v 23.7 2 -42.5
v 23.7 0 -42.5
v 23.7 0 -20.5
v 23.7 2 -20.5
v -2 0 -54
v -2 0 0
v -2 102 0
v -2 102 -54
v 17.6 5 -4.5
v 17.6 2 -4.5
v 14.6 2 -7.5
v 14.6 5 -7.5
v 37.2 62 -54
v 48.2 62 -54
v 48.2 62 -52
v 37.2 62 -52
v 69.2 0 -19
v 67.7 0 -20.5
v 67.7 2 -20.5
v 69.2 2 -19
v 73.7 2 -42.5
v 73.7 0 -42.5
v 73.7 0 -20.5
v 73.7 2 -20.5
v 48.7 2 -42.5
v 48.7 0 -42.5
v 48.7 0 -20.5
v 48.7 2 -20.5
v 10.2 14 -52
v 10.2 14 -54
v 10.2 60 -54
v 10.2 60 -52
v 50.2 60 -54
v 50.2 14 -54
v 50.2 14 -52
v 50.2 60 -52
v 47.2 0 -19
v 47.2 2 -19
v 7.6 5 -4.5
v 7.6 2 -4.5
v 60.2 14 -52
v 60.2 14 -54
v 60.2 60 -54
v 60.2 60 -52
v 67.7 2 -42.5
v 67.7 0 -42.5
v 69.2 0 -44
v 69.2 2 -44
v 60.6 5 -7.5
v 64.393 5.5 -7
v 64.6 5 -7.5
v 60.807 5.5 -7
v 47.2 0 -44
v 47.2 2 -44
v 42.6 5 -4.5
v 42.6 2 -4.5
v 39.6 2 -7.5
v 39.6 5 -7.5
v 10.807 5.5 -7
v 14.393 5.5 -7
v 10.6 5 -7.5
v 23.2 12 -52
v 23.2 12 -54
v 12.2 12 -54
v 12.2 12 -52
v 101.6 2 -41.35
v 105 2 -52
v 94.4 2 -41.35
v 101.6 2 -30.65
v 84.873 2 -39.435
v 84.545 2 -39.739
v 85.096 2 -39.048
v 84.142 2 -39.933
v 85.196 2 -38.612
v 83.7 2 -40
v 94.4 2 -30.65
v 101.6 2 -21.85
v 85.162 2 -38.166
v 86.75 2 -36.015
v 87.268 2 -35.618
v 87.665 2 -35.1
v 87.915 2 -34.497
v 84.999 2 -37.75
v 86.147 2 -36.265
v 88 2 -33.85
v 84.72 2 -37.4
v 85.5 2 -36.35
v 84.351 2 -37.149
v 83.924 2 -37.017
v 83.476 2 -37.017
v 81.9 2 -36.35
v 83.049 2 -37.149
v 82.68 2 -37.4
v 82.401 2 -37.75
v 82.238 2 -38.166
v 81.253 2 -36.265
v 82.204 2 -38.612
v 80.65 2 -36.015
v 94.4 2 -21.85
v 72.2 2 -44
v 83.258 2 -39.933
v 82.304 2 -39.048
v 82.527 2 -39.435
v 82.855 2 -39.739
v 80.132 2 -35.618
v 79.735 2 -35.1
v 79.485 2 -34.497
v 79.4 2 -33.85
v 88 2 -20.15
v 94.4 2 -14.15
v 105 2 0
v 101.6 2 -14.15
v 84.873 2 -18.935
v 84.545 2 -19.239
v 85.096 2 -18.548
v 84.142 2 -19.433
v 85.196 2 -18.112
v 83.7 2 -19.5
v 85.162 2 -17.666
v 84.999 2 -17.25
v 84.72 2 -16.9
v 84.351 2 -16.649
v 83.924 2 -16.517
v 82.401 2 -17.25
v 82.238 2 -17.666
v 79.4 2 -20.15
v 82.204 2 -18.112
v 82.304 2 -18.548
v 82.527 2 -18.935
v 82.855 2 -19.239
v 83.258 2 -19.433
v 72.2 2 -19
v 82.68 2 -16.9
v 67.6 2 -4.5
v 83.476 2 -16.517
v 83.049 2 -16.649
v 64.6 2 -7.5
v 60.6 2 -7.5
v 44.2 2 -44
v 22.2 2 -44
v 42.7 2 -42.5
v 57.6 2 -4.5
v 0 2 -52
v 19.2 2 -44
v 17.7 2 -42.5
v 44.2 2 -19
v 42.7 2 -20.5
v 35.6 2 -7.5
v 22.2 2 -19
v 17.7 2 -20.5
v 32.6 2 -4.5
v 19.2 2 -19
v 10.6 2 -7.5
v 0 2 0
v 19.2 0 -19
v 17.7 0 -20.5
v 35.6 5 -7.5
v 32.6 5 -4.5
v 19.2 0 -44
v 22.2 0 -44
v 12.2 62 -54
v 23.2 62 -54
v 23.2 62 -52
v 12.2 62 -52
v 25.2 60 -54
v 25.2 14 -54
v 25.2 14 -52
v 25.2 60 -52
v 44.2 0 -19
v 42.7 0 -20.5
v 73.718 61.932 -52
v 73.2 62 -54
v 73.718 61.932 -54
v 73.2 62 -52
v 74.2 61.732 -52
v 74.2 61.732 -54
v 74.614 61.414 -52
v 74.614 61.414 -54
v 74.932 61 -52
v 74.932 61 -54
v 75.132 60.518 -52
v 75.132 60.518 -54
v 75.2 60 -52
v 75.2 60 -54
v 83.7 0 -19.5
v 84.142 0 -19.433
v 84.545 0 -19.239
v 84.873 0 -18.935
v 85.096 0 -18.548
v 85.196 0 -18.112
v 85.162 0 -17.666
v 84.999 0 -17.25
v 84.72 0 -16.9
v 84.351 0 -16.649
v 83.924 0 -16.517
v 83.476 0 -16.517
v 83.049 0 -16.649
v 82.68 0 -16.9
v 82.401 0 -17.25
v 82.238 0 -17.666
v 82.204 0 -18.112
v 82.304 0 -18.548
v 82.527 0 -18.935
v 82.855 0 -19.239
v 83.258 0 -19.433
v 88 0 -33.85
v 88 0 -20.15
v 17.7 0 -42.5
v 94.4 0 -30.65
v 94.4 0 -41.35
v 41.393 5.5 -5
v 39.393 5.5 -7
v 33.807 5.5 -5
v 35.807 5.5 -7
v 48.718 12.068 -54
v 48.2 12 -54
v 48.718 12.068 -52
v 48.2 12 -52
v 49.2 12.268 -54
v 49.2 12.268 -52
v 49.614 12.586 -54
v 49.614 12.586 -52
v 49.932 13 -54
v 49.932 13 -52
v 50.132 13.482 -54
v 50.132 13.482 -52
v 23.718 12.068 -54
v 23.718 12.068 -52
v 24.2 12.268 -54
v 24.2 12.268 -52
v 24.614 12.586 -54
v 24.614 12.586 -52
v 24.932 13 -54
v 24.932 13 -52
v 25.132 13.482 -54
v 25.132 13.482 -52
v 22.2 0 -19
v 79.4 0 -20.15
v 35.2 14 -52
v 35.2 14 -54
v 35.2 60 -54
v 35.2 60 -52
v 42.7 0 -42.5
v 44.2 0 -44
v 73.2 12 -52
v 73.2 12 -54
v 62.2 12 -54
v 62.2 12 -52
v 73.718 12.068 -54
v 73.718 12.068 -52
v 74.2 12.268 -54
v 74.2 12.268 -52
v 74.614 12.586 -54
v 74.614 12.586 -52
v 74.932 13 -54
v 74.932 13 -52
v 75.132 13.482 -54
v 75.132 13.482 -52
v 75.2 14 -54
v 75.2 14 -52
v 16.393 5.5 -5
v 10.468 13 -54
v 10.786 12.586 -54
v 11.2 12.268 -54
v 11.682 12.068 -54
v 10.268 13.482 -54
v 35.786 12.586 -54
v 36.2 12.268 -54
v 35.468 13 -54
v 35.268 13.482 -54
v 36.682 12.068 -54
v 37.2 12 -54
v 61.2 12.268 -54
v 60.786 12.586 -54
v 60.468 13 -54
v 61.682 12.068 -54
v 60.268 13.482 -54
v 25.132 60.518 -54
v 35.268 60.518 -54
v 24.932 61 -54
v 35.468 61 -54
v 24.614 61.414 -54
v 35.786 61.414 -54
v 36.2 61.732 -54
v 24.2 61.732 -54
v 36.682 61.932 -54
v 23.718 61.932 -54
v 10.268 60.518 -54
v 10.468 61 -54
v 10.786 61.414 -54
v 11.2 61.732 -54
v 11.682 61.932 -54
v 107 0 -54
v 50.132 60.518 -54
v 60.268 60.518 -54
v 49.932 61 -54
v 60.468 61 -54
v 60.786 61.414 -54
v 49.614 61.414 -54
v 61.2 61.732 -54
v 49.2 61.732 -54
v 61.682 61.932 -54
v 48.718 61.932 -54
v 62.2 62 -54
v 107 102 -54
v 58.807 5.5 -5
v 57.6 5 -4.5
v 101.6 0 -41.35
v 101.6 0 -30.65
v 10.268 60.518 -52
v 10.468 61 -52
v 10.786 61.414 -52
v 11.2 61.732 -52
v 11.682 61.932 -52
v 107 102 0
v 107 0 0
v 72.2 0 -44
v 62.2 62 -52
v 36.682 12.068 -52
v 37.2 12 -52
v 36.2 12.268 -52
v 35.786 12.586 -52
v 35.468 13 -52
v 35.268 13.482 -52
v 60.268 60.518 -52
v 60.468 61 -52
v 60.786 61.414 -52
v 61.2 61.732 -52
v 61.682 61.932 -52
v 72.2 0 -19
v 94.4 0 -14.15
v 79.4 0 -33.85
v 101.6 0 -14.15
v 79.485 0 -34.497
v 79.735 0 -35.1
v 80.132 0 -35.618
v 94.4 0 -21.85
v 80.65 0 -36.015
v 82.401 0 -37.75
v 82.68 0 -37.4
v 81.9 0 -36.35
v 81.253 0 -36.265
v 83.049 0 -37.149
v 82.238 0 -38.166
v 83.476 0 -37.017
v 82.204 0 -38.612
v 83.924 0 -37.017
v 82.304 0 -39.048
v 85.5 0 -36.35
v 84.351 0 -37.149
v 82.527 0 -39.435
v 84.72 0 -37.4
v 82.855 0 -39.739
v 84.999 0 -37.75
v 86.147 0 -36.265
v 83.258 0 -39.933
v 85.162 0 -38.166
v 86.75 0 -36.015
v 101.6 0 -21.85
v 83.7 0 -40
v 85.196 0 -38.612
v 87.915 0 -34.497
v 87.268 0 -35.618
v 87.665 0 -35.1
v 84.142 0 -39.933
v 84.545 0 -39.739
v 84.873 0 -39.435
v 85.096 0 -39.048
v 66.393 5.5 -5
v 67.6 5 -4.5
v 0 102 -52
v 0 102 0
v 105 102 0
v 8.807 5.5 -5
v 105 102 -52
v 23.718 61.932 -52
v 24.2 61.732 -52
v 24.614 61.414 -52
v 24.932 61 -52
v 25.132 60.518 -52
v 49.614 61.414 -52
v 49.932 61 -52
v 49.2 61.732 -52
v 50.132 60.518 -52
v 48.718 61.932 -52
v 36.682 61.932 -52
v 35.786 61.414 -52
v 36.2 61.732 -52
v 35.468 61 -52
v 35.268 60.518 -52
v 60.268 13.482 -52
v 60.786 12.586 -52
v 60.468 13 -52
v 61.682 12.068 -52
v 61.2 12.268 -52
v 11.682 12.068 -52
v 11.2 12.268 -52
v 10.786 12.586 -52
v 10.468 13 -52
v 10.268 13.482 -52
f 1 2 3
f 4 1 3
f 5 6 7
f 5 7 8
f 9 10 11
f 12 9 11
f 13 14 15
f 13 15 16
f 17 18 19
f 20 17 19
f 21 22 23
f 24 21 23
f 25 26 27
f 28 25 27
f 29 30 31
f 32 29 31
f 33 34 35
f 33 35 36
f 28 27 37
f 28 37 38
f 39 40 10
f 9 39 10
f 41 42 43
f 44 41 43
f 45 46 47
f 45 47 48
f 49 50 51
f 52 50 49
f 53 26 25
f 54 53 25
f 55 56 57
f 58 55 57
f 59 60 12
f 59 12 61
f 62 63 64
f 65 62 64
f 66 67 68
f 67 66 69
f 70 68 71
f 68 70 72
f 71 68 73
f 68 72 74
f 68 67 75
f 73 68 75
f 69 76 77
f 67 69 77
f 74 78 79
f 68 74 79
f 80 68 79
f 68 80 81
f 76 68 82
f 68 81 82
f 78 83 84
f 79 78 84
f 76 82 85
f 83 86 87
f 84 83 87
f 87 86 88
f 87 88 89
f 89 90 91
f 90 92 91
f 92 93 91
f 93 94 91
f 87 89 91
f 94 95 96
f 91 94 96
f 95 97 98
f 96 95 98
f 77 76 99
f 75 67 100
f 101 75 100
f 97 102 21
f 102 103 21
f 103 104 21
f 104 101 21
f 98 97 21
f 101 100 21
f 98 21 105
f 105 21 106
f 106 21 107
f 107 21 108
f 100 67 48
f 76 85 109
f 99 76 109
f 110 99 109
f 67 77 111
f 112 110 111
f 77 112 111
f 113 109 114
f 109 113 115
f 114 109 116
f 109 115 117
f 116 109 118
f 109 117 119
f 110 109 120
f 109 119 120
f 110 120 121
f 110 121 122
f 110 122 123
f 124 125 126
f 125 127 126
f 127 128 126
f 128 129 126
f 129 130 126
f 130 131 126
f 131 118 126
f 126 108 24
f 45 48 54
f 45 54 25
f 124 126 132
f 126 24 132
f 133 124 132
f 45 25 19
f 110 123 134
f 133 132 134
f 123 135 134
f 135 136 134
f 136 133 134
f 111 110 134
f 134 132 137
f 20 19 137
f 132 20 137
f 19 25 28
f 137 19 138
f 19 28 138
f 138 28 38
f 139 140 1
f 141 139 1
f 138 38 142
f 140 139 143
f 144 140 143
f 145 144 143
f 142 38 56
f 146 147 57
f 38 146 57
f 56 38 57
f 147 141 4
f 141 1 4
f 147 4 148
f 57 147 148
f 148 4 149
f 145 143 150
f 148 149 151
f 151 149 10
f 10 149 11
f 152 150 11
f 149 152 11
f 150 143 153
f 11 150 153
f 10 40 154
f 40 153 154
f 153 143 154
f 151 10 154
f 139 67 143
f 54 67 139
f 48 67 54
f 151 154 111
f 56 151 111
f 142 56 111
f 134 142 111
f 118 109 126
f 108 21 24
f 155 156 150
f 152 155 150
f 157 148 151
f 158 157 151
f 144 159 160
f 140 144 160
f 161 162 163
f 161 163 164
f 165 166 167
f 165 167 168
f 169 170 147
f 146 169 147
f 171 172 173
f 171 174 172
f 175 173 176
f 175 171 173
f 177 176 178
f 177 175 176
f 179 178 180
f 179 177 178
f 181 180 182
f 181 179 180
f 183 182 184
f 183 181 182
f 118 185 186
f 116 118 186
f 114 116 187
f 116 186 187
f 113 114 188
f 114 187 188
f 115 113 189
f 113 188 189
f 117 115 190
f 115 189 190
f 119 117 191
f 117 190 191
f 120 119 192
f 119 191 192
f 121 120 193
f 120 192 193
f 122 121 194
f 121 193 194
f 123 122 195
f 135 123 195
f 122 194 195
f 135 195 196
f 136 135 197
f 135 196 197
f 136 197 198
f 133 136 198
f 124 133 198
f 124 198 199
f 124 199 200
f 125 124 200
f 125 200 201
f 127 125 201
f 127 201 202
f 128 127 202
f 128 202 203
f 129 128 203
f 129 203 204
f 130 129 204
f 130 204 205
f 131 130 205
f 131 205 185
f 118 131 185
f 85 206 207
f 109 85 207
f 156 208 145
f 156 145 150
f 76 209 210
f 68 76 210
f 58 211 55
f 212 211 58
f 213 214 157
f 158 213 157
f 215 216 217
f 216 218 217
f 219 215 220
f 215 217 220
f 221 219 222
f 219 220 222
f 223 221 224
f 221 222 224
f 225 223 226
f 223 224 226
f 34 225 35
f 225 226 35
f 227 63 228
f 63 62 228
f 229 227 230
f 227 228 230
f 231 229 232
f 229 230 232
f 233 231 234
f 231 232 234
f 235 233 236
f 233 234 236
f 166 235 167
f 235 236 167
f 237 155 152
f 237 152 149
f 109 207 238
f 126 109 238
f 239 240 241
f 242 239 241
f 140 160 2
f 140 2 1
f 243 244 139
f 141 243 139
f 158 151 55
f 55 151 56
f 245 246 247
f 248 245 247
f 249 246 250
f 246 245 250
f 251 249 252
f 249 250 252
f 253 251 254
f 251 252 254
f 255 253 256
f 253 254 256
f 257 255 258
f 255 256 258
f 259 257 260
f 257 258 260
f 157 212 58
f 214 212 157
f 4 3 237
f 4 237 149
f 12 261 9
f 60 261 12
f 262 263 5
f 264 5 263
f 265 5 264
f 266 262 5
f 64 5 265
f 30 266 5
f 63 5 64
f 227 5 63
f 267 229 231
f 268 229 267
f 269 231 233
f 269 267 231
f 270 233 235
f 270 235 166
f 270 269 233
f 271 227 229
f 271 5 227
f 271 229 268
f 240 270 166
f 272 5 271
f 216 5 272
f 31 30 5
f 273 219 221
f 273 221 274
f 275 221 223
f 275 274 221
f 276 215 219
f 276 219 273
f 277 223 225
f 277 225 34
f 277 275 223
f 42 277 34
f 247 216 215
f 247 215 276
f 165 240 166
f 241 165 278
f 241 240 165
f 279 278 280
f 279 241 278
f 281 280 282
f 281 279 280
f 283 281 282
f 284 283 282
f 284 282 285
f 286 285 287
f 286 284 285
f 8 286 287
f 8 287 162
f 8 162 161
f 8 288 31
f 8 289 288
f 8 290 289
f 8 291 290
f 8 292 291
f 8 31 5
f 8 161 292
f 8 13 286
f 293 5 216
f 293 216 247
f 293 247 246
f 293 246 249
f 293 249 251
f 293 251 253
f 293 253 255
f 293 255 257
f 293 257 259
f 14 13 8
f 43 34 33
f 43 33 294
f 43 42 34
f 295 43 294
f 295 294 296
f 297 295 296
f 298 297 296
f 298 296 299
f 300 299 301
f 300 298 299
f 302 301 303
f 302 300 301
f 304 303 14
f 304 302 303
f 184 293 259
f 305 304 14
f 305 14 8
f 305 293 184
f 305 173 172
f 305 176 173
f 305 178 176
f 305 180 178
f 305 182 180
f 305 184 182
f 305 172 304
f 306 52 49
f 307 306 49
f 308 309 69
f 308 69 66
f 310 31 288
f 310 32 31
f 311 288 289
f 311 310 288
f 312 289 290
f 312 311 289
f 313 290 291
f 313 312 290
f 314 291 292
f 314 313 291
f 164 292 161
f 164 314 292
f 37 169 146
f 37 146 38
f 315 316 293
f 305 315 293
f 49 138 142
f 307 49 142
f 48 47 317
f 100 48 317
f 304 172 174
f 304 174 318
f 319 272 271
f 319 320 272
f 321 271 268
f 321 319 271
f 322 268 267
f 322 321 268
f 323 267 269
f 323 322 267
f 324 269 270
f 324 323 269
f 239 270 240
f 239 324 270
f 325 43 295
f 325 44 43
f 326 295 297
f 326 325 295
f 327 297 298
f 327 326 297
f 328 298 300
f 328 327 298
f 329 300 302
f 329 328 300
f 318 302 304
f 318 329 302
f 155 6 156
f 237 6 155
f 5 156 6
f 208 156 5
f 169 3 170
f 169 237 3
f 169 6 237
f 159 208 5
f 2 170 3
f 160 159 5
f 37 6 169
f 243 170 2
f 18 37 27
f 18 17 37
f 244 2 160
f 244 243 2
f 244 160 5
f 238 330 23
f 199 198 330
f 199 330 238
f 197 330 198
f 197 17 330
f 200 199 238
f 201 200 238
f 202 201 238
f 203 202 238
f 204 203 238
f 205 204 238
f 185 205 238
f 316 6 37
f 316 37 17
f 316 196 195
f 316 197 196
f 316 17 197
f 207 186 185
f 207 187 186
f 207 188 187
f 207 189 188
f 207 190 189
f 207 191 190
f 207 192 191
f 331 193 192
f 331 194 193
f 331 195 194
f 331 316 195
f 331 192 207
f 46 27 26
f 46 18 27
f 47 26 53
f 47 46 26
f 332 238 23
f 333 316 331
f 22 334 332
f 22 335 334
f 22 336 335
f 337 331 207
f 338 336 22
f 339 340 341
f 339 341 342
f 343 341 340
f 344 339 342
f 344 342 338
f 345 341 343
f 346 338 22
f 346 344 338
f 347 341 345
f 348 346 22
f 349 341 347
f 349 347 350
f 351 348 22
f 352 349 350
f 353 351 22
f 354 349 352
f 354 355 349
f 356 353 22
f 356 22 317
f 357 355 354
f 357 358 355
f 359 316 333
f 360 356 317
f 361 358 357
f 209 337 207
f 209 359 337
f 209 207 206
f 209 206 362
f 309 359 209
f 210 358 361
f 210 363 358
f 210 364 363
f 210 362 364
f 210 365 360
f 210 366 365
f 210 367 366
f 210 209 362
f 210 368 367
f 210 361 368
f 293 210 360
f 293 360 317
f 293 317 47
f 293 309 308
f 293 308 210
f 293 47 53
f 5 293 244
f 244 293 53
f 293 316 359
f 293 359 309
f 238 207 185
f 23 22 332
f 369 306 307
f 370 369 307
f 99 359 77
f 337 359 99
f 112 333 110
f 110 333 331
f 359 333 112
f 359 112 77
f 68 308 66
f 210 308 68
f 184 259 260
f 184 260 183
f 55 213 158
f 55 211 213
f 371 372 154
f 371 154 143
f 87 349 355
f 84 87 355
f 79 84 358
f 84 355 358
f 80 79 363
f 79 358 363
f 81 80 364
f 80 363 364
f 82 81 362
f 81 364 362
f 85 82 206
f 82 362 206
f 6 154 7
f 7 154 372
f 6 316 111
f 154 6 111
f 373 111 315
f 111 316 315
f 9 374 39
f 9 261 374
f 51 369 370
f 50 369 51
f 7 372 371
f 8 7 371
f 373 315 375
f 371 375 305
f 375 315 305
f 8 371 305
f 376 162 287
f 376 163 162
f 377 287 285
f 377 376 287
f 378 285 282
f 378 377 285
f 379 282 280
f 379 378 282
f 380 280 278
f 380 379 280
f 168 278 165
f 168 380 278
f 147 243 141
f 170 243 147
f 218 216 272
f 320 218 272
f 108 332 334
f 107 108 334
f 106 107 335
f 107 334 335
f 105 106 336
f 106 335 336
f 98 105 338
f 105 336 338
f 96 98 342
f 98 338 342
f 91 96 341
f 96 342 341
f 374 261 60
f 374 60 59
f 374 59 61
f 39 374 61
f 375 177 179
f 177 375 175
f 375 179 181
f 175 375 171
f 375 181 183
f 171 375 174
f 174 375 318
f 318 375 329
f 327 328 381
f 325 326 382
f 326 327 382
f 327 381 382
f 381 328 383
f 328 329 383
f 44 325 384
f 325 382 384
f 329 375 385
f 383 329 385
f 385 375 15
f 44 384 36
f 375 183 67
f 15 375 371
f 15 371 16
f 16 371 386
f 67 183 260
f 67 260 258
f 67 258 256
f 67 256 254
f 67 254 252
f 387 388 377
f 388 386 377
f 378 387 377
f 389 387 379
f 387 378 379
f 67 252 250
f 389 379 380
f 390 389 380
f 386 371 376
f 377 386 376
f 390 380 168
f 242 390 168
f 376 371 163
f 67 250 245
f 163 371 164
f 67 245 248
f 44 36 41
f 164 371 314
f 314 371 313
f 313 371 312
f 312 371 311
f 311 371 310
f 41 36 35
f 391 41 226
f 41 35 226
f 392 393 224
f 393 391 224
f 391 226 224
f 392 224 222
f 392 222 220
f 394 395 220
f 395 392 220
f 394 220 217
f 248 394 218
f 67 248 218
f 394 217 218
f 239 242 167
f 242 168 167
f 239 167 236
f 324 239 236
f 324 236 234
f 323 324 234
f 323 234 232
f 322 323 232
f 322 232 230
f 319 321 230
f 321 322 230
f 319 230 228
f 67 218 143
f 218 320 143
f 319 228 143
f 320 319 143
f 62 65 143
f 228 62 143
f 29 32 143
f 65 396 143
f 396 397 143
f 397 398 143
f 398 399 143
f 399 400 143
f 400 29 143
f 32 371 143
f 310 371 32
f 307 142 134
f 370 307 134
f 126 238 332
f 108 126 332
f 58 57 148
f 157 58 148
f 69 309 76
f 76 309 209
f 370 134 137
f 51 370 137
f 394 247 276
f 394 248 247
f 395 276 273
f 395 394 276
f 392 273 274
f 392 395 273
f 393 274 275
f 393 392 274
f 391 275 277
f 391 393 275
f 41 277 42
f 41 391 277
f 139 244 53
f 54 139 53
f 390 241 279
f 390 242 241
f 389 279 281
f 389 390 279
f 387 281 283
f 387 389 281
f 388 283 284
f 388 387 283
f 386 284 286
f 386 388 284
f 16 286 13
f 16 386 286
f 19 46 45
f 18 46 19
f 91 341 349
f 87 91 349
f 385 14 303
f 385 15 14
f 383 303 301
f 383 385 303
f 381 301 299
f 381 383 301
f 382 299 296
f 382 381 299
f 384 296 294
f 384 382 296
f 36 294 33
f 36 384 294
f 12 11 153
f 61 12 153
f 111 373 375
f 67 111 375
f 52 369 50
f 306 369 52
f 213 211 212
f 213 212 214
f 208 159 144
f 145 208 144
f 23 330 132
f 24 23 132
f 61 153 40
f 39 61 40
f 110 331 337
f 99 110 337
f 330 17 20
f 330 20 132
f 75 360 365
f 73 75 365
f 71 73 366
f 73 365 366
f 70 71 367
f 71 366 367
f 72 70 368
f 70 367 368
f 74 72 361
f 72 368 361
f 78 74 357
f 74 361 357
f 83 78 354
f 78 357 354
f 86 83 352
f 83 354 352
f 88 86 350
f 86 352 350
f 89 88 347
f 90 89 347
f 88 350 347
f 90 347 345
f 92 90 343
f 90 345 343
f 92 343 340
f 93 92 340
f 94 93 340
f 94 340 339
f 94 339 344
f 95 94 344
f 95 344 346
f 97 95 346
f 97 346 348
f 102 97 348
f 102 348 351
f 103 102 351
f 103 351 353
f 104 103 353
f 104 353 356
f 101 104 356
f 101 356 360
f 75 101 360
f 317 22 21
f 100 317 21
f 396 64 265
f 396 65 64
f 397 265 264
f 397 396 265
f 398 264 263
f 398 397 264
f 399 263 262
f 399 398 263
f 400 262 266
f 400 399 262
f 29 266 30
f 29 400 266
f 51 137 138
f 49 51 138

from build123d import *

# Parameters (mm, degrees)
BOSS_EXTRUDE1_DEPTH = 105
SKETCH3_W           = 54
SKETCH3_H           = 102
BOSS_EXTRUDE2_DEPTH = 2
BOSS_EXTRUDE3_START = -105
SKETCH3_2_W         = 54
SKETCH3_2_H         = 102
BOSS_EXTRUDE3_DEPTH = 2
BOSS_EXTRUDE4_DEPTH = 3.5
CHAMFER1_SIZE       = 0.5
SKETCH5_W           = 15
SKETCH5_H           = 50
CUT_EXTRUDE1_DEPTH  = 158.381701605
SKETCH7_W           = 6
SKETCH7_H           = 25
CUT_EXTRUDE2_DEPTH  = 158.381701605
FILLET1_R           = 2
CHAMFER2_SIZE       = 1.5
SKETCH8_R           = 1.5
SKETCH8_W           = 7.2
SKETCH8_H           = 7.7
SKETCH8_H_2         = 10.7
CUT_EXTRUDE3_DEPTH  = 158.381701605


with BuildPart() as part:
    # Sketch1 → Boss-Extrude1 (new body)
    with BuildSketch(Plane(origin=(0, 0, 0), x_dir=(0, 0, -1), z_dir=(1, 0, 0))):
        Polygon((0, 0), (54, 0), (54, 102), (52, 102), (52, 2), (0, 2), align=None)
    extrude(amount=BOSS_EXTRUDE1_DEPTH)

    # Sketch3 → Boss-Extrude2 (add)
    with BuildSketch(Plane(origin=(105, 0, 0), x_dir=(0, 0, -1), z_dir=(1, 0, 0))):
        with Locations((27, 51)):
            Rectangle(SKETCH3_W, SKETCH3_H)
    extrude(amount=BOSS_EXTRUDE2_DEPTH)

    # Sketch3<2> → Boss-Extrude3 (add)
    with BuildSketch(Plane(origin=(105, 0, 0), x_dir=(0, 0, -1), z_dir=(1, 0, 0)).offset(BOSS_EXTRUDE3_START)):
        with Locations((27, 51)):
            Rectangle(SKETCH3_2_W, SKETCH3_2_H)
    extrude(amount=-BOSS_EXTRUDE3_DEPTH)

    # Sketch4 → Boss-Extrude4 (add)
    with BuildSketch(Plane.XZ.offset(-2)):
        Polygon((42.6, -4.5), (39.6, -7.5), (35.6, -7.5), (32.6, -4.5), align=None)
        Polygon((17.6, -4.5), (14.6, -7.5), (10.6, -7.5), (7.6, -4.5), align=None)
        Polygon((67.6, -4.5), (64.6, -7.5), (60.6, -7.5), (57.6, -4.5), align=None)
    extrude(amount=-BOSS_EXTRUDE4_DEPTH)

    # Chamfer1
    chamfer1_edges = [part.edges().sort_by_distance(p)[0] for p in [
        (12.6, 5.5, -4.5),
        (16.1, 5.5, -6),
        (12.6, 5.5, -7.5),
        (9.1, 5.5, -6),
        (37.6, 5.5, -4.5),
        (41.1, 5.5, -6),
        (37.6, 5.5, -7.5),
        (34.1, 5.5, -6),
        (62.6, 5.5, -4.5),
        (66.1, 5.5, -6),
        (62.6, 5.5, -7.5),
        (59.1, 5.5, -6),
    ]]
    chamfer(chamfer1_edges, length=CHAMFER1_SIZE)

    # Sketch5 → Cut-Extrude1 (cut, through all)
    with BuildSketch(Plane(origin=(0, 0, -54), x_dir=(-1, 0, 0), z_dir=(0, 0, -1))):
        with Locations((-42.7, 37)):
            Rectangle(SKETCH5_W, SKETCH5_H)
        with Locations((-17.7, 37)):
            Rectangle(SKETCH5_W, SKETCH5_H)
        with Locations((-67.7, 37)):
            Rectangle(SKETCH5_W, SKETCH5_H)
    extrude(amount=-CUT_EXTRUDE1_DEPTH, mode=Mode.SUBTRACT)

    # Sketch7 → Cut-Extrude2 (cut, through all)
    with BuildSketch(Plane.XZ):
        with Locations((20.7, -31.5)):
            Rectangle(SKETCH7_W, SKETCH7_H)
        with Locations((45.7, -31.5)):
            Rectangle(SKETCH7_W, SKETCH7_H)
        with Locations((70.7, -31.5)):
            Rectangle(SKETCH7_W, SKETCH7_H)
    extrude(amount=-CUT_EXTRUDE2_DEPTH, mode=Mode.SUBTRACT)

    # Fillet1
    fillet1_edges = [part.edges().sort_by_distance(p)[0] for p in [
        (25.2, 12, -53),
        (25.2, 62, -53),
        (10.2, 62, -53),
        (10.2, 12, -53),
        (50.2, 62, -53),
        (35.2, 62, -53),
        (35.2, 12, -53),
        (50.2, 12, -53),
        (75.2, 62, -53),
        (60.2, 62, -53),
        (60.2, 12, -53),
        (75.2, 12, -53),
    ]]
    fillet(fillet1_edges, radius=FILLET1_R)

    # Chamfer2
    chamfer2_edges = [part.edges().sort_by_distance(p)[0] for p in [
        (17.7, 1, -44),
        (17.7, 1, -19),
        (23.7, 1, -19),
        (23.7, 1, -44),
        (48.7, 1, -44),
        (42.7, 1, -44),
        (42.7, 1, -19),
        (48.7, 1, -19),
        (73.7, 1, -44),
        (67.7, 1, -44),
        (67.7, 1, -19),
        (73.7, 1, -19),
    ]]
    chamfer(chamfer2_edges, length=CHAMFER2_SIZE)

    # Sketch8 → Cut-Extrude3 (cut, through all)
    with BuildSketch(Plane(origin=(0, 0, 0), x_dir=(-1, 0, 0), z_dir=(0, -1, 0))):
        with Locations(Location((-83.7, 18, 0), (0, 0, 90))):
            Circle(SKETCH8_R)
        with Locations(Location((-83.7, 38.5, 0), (0, 0, 90))):
            Circle(SKETCH8_R)
        with BuildLine():
            Line((-81.9, 36.35), (-85.5, 36.35))
            ThreePointArc((-85.5, 36.35), (-87.267766953, 35.617766953), (-88, 33.85))
            Line((-88, 33.85), (-88, 20.15))
            Line((-88, 20.15), (-79.4, 20.15))
            Line((-79.4, 20.15), (-79.4, 33.85))
            ThreePointArc((-79.4, 33.85), (-80.132233047, 35.617766953), (-81.9, 36.35))
        make_face()
        with Locations((-98, 18)):
            Rectangle(SKETCH8_W, SKETCH8_H)
        with Locations((-98, 36)):
            Rectangle(SKETCH8_W, SKETCH8_H_2)
    extrude(amount=-CUT_EXTRUDE3_DEPTH, mode=Mode.SUBTRACT)


solid = part.part
